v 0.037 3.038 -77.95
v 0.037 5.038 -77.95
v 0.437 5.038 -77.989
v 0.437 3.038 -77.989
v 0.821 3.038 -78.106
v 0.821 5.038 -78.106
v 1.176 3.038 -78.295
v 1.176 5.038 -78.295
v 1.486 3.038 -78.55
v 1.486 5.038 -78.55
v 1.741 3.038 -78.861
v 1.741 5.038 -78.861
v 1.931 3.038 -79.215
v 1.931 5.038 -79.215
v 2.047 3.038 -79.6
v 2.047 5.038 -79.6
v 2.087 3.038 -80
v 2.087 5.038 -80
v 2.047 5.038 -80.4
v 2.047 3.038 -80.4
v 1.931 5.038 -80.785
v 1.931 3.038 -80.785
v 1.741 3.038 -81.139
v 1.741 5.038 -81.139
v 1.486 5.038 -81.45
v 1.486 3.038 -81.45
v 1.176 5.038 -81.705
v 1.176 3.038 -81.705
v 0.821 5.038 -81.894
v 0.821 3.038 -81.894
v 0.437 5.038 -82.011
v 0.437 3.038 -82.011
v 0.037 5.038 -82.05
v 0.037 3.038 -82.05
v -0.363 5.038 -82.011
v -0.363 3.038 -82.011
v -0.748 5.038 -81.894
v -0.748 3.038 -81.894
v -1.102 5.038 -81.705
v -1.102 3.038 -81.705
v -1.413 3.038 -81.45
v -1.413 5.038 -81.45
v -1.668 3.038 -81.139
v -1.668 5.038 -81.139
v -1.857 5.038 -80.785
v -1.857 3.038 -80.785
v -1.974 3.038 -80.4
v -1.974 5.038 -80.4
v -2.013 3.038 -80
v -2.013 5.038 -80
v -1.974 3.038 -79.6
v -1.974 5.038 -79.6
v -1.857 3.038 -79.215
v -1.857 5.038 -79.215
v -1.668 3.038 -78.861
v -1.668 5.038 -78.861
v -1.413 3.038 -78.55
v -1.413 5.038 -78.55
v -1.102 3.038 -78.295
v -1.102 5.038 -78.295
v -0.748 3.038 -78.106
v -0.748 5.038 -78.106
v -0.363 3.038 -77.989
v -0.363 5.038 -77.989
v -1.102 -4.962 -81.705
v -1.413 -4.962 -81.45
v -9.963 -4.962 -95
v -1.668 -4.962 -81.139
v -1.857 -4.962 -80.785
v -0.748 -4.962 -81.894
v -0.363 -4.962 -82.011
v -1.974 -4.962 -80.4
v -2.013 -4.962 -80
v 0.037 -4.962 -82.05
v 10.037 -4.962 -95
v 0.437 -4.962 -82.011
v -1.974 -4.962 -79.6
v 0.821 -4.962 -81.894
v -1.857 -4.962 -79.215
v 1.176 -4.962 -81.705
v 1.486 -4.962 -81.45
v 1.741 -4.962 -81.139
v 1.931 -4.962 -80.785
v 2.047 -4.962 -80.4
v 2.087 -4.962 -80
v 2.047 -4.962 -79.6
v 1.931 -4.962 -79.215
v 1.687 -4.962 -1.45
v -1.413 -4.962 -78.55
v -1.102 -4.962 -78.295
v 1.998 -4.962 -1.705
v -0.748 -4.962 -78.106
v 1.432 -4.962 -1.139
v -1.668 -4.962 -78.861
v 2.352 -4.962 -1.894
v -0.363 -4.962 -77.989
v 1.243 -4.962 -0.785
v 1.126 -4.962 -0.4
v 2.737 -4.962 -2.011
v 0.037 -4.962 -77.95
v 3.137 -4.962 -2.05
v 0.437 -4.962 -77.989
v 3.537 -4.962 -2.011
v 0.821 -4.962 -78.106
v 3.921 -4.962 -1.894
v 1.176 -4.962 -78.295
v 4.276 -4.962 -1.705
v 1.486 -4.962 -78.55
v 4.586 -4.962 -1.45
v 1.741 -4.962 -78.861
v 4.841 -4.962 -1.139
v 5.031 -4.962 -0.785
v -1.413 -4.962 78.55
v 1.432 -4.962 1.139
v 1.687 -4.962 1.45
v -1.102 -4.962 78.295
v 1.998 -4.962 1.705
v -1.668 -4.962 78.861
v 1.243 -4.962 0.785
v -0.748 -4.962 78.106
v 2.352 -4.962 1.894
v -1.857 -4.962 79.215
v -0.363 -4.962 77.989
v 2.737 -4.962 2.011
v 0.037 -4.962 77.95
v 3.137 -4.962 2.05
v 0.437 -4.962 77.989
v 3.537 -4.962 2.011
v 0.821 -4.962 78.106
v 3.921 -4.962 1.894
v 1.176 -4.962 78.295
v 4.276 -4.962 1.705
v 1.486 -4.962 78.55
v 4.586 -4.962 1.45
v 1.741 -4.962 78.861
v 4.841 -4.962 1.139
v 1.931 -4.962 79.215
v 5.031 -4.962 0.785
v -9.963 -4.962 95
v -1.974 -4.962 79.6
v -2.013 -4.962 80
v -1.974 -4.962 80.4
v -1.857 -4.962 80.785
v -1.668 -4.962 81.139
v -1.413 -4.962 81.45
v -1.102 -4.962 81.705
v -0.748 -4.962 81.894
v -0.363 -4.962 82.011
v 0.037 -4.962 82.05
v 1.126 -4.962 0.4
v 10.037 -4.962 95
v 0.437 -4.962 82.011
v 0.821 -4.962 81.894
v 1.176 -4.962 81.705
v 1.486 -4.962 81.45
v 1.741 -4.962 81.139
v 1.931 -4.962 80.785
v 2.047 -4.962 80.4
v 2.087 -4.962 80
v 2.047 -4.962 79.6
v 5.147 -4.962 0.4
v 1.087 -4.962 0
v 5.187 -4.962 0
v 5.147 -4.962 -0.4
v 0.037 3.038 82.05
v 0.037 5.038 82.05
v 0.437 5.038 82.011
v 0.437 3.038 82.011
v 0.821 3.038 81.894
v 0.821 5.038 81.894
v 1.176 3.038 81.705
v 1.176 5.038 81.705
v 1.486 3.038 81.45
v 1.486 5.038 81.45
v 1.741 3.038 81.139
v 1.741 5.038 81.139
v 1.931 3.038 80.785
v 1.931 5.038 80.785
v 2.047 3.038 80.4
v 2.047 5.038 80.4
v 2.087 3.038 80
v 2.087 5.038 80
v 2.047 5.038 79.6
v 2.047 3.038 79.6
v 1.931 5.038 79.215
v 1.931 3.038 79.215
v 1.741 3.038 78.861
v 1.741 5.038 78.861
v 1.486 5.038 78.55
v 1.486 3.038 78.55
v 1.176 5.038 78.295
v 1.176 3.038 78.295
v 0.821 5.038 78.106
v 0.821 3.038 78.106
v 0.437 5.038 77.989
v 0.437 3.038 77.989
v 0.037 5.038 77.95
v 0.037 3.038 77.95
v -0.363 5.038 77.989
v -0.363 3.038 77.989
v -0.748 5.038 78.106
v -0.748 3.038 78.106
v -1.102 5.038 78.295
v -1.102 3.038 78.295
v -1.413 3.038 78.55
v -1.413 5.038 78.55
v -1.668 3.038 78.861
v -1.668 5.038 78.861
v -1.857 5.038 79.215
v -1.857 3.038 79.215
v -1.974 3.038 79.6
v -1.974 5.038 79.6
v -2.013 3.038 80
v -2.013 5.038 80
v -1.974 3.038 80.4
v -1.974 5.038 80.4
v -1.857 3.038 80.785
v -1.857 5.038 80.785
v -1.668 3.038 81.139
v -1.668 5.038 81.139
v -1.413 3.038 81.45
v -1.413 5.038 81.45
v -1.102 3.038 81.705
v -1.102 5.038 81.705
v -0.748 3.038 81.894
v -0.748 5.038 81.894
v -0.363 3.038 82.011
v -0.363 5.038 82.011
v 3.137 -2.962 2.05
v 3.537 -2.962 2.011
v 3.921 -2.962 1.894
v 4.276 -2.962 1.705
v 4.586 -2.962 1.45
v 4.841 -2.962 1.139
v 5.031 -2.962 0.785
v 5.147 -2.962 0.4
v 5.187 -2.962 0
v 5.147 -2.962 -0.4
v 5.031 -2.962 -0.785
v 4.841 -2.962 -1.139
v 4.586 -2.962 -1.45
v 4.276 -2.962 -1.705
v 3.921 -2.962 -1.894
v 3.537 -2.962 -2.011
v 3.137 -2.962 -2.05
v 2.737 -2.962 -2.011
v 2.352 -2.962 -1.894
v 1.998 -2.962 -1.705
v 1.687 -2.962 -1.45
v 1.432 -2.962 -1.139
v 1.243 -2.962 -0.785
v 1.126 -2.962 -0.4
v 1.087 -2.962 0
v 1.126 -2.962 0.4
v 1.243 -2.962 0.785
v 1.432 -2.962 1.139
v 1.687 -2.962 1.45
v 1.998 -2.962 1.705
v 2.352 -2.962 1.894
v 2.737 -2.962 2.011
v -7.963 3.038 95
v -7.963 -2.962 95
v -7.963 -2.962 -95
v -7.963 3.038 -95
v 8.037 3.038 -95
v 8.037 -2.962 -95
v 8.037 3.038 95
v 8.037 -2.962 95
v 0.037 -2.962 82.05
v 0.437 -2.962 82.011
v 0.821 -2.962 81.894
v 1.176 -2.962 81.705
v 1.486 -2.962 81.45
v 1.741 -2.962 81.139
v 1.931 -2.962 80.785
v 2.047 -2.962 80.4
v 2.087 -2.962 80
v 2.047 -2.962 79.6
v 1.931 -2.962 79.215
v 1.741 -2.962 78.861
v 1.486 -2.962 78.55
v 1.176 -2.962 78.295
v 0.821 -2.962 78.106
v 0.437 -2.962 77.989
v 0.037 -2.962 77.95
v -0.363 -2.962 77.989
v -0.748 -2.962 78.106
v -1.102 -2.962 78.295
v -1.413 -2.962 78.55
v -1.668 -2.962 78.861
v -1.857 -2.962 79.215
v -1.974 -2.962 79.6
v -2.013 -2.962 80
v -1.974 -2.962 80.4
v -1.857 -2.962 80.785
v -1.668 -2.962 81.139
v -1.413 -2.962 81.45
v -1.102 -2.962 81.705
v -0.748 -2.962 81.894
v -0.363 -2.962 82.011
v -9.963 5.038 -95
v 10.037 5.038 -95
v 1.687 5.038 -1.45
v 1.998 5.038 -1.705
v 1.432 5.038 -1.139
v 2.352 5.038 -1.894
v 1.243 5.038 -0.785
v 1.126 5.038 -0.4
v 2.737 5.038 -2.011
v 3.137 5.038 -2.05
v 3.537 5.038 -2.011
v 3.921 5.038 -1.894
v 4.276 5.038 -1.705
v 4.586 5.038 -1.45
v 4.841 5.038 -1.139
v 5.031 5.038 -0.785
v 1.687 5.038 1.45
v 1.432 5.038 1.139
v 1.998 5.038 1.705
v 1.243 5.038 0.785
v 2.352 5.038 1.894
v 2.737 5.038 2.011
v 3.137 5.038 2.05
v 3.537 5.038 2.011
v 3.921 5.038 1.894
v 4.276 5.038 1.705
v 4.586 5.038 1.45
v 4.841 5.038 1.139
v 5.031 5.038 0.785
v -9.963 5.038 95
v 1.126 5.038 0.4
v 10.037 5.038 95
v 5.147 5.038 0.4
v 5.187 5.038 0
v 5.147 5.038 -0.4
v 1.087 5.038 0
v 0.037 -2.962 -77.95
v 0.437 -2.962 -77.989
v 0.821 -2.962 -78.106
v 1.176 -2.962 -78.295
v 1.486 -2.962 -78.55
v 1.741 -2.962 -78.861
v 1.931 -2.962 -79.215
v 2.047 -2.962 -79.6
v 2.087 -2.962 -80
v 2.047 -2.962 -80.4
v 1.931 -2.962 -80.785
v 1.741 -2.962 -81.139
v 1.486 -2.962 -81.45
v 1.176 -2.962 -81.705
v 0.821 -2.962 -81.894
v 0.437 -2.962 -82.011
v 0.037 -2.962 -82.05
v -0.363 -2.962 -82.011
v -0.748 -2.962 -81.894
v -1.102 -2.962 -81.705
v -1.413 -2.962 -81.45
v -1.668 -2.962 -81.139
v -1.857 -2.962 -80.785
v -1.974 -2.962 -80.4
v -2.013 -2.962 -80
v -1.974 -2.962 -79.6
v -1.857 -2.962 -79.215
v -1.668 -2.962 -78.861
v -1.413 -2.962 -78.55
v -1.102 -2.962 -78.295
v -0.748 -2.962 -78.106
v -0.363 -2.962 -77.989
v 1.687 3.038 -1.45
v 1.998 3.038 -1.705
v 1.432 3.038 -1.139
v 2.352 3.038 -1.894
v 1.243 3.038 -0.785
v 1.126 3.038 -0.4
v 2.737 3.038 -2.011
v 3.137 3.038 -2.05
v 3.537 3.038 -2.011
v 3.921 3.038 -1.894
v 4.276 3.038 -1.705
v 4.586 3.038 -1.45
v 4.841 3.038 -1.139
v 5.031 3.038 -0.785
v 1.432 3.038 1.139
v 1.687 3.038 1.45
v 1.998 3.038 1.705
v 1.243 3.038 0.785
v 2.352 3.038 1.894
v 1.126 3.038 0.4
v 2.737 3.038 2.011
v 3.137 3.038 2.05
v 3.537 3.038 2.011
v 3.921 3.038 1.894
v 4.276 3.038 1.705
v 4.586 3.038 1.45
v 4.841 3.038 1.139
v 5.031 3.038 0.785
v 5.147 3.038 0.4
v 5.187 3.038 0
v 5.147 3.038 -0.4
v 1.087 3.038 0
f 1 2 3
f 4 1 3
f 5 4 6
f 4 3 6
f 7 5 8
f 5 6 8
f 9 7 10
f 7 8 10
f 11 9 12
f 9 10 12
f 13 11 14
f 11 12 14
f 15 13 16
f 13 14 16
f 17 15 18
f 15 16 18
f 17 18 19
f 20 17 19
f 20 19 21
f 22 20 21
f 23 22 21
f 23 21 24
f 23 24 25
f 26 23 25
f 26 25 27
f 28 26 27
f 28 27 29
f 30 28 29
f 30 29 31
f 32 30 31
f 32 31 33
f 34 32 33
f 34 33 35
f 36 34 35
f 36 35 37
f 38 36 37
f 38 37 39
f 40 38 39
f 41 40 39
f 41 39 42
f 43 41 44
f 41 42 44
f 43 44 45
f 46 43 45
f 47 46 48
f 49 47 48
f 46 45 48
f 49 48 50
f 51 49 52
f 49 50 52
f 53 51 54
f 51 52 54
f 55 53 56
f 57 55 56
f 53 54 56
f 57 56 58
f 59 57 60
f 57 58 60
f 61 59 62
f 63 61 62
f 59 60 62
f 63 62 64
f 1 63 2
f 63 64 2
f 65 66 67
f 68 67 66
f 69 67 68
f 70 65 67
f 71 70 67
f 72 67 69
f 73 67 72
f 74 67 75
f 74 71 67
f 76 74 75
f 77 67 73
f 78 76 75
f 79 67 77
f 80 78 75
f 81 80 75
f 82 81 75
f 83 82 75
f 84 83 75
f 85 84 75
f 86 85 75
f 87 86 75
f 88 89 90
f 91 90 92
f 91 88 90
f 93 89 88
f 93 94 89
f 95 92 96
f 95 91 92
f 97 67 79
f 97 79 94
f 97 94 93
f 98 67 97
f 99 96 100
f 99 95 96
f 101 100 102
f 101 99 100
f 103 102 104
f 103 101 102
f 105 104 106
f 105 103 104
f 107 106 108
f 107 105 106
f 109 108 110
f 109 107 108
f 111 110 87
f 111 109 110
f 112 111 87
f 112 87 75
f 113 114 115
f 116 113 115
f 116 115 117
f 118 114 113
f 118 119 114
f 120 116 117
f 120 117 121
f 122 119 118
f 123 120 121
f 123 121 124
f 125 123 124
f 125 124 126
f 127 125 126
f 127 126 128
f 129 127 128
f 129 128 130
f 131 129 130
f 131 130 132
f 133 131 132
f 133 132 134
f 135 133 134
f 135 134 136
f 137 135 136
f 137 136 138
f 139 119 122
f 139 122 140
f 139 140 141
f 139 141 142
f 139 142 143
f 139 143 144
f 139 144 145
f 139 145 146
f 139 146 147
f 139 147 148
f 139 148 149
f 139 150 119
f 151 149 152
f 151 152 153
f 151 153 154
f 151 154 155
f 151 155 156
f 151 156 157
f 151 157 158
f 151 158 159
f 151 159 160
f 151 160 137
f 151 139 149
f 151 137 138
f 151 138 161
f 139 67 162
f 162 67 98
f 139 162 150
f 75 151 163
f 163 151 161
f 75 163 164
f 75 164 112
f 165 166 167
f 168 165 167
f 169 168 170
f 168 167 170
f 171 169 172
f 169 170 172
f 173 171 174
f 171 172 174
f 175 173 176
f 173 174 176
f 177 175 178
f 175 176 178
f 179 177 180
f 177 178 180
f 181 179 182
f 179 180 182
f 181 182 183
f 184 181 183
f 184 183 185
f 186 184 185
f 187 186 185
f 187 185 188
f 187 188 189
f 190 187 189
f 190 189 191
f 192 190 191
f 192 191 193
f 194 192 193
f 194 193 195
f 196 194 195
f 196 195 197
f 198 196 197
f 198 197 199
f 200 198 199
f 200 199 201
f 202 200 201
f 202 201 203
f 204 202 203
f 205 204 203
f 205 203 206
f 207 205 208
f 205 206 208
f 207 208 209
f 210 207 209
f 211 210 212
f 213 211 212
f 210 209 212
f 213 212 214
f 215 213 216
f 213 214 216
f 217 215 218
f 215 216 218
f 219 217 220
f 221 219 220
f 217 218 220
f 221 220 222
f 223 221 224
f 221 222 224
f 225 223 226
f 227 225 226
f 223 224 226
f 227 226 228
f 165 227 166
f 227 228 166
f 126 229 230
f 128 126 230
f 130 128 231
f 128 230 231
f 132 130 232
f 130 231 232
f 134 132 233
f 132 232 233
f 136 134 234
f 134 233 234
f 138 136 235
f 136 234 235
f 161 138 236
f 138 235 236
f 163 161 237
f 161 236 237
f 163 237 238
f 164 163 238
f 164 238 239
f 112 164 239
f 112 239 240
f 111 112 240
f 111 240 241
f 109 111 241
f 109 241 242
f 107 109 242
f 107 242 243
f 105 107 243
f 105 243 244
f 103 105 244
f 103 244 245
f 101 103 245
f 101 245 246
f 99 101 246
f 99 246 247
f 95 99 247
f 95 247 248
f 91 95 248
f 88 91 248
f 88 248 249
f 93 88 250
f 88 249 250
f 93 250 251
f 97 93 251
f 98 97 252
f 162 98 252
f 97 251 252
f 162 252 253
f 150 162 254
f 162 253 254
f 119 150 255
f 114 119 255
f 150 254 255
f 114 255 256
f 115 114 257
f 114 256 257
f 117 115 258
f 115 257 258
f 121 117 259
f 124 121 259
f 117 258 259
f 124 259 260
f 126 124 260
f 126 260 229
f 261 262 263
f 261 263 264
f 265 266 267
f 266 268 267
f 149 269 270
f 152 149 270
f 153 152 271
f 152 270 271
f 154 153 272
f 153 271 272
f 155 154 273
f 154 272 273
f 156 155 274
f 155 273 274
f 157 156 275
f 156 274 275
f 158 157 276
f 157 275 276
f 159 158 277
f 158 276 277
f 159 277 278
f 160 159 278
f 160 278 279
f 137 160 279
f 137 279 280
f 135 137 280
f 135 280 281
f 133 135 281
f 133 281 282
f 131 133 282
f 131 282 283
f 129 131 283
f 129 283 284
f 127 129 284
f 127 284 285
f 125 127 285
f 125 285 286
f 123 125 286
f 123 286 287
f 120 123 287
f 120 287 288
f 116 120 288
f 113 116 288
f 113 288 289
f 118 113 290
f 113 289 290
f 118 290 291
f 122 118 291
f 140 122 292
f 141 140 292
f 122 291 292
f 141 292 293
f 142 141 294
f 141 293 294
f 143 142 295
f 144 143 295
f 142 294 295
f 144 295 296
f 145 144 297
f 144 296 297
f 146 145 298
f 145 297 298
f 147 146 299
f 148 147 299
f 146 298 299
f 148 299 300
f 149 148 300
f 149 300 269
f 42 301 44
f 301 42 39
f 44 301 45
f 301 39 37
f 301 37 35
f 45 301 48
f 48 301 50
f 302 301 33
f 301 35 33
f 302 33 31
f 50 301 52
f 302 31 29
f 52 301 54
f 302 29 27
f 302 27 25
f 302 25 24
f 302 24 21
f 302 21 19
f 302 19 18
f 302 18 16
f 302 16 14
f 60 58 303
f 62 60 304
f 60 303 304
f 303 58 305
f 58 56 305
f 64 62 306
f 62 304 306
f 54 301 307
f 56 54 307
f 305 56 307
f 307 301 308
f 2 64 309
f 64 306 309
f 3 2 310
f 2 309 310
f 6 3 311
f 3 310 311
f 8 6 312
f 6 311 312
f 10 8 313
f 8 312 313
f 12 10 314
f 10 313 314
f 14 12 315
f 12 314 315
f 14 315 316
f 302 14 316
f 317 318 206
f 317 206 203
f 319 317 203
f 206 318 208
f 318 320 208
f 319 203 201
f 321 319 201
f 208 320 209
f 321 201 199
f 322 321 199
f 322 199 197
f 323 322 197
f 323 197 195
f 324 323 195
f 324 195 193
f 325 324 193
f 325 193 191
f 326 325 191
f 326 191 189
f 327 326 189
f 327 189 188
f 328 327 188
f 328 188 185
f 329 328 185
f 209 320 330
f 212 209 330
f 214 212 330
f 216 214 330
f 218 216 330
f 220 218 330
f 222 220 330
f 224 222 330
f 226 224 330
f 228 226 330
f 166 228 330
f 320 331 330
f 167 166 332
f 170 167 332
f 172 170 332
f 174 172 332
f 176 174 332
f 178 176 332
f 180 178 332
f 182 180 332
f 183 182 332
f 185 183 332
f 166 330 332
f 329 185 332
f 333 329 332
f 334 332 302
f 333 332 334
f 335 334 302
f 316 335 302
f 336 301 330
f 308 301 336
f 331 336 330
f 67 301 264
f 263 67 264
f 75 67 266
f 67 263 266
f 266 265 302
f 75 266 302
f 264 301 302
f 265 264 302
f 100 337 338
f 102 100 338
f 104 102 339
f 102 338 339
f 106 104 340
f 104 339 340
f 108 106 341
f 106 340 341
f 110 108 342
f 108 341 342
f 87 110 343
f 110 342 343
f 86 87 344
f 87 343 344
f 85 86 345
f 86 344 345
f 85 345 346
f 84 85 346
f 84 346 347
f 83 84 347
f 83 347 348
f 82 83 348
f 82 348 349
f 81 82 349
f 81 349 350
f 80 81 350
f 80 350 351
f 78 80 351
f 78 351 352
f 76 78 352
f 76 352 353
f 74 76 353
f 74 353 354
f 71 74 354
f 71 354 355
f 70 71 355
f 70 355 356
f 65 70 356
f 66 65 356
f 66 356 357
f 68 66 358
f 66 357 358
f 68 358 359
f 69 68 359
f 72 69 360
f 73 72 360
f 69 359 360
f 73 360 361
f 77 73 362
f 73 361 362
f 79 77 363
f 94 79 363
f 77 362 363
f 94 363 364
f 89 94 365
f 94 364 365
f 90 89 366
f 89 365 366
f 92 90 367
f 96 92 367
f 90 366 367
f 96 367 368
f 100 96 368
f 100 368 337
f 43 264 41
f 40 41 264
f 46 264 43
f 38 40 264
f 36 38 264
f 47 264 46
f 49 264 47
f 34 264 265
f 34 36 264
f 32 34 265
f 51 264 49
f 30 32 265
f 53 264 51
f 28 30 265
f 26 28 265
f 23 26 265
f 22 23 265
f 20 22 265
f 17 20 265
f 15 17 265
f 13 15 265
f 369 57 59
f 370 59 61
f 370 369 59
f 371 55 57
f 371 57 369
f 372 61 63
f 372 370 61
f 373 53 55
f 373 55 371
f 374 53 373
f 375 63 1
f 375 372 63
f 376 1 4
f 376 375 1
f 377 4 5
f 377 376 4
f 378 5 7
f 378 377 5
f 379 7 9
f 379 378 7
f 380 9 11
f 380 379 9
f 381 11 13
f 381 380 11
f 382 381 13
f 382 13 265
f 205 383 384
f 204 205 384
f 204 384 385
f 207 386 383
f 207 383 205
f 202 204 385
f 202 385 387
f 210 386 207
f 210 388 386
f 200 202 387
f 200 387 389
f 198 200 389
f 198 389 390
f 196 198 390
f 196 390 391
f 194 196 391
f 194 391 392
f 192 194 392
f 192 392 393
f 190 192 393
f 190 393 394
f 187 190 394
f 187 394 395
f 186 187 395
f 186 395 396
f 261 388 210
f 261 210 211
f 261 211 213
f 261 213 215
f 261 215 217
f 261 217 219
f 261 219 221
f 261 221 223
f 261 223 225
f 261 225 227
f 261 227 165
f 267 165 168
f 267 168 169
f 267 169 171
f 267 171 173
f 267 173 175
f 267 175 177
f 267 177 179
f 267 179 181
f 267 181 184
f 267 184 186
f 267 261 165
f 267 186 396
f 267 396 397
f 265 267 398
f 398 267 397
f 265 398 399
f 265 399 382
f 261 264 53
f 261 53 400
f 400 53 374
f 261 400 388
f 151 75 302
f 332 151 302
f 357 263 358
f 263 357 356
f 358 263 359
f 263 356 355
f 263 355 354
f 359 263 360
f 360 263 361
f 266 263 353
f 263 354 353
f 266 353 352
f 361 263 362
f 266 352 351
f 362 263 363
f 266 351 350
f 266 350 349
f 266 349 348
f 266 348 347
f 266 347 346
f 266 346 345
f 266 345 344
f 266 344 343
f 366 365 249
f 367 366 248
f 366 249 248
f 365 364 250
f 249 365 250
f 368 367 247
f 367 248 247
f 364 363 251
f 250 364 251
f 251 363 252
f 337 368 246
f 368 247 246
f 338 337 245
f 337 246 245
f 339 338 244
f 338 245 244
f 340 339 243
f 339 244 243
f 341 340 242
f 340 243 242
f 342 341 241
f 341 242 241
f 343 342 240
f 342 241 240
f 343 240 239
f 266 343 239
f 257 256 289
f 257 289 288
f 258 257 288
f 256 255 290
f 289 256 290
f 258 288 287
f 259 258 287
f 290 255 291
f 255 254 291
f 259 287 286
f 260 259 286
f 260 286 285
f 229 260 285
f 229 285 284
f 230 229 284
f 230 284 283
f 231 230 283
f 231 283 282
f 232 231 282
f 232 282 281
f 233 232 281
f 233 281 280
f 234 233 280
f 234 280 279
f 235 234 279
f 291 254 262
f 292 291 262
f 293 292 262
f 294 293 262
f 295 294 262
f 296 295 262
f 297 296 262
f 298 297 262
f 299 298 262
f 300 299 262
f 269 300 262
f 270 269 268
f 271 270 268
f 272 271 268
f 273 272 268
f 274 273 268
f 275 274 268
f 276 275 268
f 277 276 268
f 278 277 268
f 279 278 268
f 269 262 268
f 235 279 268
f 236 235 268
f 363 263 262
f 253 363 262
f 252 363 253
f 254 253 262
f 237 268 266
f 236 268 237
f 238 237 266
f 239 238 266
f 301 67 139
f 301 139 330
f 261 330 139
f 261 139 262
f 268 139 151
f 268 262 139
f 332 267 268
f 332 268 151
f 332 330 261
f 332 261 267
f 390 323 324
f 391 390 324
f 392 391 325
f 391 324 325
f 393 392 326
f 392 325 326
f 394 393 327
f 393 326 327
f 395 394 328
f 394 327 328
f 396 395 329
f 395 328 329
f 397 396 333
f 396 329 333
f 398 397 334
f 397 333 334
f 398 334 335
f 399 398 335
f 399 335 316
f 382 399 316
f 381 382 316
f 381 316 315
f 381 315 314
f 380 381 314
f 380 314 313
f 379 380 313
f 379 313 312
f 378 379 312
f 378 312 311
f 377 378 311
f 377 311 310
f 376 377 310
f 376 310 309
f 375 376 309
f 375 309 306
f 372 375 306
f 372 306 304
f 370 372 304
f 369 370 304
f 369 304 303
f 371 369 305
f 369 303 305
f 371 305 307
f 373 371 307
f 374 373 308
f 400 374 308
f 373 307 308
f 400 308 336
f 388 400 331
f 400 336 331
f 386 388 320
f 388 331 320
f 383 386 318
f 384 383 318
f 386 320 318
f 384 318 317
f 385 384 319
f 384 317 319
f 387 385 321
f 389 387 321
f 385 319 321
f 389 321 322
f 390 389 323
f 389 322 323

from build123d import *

# Parameters (mm, degrees)
SKETCH_1_W          = 20
SKETCH_1_H          = 10
SKETCH_1_W_2        = 16
SKETCH_1_H_2        = 6
EXTRUDE_1_DEPTH     = 95
SKETCH_3_R          = 2.05
CUT_EXTRUDE_1_DEPTH = 97.050697163


with BuildPart() as part:
    # 草图1 → 凸台-拉伸1 (new, symmetric)
    with BuildSketch(Plane.XY):
        with Locations((0.036753729, 0.03823935)):
            Rectangle(SKETCH_1_W, SKETCH_1_H)
        with Locations((0.036753729, 0.03823935)):
            Rectangle(SKETCH_1_W_2, SKETCH_1_H_2, mode=Mode.SUBTRACT)
    extrude(amount=EXTRUDE_1_DEPTH, both=True)

    # 草图3 → 切除-拉伸1 (cut, through all)
    with BuildSketch(Plane(origin=(0, 5.03823935, 0), x_dir=(1, 0, 0), z_dir=(0, 1, 0))):
        with Locations(Location((3.136753729, 0, 0), (0, 0, 270))):
            Circle(SKETCH_3_R)
        with Locations(Location((0.036753729, 80, 0), (0, 0, 270))):
            Circle(SKETCH_3_R)
        with Locations(Location((0.036753729, -80, 0), (0, 0, 270))):
            Circle(SKETCH_3_R)
    extrude(amount=-CUT_EXTRUDE_1_DEPTH, mode=Mode.SUBTRACT)


solid = part.part
